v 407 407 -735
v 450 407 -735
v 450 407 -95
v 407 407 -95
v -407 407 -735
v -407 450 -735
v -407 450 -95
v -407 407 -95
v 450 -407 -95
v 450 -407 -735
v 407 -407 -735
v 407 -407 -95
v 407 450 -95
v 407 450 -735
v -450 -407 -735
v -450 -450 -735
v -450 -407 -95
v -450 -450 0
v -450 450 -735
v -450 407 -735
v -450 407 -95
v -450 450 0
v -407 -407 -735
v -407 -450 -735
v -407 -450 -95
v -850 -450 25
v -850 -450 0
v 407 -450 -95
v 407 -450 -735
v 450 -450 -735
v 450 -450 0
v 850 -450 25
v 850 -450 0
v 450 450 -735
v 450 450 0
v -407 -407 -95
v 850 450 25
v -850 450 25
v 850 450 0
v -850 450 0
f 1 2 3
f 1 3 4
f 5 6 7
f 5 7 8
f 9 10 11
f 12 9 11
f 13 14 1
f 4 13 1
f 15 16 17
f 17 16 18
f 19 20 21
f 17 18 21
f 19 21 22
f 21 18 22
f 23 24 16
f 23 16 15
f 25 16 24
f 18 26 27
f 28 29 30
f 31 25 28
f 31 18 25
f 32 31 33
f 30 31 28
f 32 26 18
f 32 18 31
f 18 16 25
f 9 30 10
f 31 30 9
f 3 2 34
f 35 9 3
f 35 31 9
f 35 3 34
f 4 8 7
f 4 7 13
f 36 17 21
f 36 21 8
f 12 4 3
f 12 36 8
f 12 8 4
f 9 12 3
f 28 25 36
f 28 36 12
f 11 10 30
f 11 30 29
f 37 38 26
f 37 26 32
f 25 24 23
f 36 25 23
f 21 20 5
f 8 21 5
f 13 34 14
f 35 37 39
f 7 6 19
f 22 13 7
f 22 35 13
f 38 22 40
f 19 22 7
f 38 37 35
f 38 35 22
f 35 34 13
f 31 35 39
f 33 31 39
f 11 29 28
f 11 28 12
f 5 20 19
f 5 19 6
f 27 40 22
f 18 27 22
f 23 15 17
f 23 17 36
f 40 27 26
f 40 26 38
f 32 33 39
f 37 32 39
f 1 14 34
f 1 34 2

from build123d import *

# Parameters (mm, degrees)
SKETCH_W           = 1700
SKETCH_H           = 900
PAD_DEPTH          = 25
SKETCH001_W        = 900
SKETCH001_H        = 900
PAD001_DEPTH       = 95
SKETCH002_W        = 43
SKETCH002_H        = 43
PAD002_DEPTH       = 640
POLARPATTERN_COUNT = 4


with BuildPart() as part:
    # Sketch → Pad (new body)
    with BuildSketch(Plane.XY):
        Rectangle(SKETCH_W, SKETCH_H)
    extrude(amount=PAD_DEPTH)

    # Sketch001 (on Face5 of Pad) → Pad001 (join)
    with BuildSketch(Plane(origin=(0, 0, 0), x_dir=(1, 0, 0), z_dir=(0, 0, -1))):
        Rectangle(SKETCH001_W, SKETCH001_H)
    extrude(amount=PAD001_DEPTH)

    # Sketch002 (on Face11 of Pad001) → Pad002 (join)
    with BuildSketch(Plane(origin=(0, 0, -95), x_dir=(1, 0, 0), z_dir=(0, 0, -1))):
        with Locations((-428.5, -428.5)):
            Rectangle(SKETCH002_W, SKETCH002_H)
    pad002 = extrude(amount=PAD002_DEPTH)

    # PolarPattern: Pad002 ×4 about axis
    polarpattern_axis = Axis((0, 0, -95), (0, 0, -1))
    for i in range(1, POLARPATTERN_COUNT):
        add(pad002.rotate(polarpattern_axis, i * 360 / POLARPATTERN_COUNT))


solid = part.part
